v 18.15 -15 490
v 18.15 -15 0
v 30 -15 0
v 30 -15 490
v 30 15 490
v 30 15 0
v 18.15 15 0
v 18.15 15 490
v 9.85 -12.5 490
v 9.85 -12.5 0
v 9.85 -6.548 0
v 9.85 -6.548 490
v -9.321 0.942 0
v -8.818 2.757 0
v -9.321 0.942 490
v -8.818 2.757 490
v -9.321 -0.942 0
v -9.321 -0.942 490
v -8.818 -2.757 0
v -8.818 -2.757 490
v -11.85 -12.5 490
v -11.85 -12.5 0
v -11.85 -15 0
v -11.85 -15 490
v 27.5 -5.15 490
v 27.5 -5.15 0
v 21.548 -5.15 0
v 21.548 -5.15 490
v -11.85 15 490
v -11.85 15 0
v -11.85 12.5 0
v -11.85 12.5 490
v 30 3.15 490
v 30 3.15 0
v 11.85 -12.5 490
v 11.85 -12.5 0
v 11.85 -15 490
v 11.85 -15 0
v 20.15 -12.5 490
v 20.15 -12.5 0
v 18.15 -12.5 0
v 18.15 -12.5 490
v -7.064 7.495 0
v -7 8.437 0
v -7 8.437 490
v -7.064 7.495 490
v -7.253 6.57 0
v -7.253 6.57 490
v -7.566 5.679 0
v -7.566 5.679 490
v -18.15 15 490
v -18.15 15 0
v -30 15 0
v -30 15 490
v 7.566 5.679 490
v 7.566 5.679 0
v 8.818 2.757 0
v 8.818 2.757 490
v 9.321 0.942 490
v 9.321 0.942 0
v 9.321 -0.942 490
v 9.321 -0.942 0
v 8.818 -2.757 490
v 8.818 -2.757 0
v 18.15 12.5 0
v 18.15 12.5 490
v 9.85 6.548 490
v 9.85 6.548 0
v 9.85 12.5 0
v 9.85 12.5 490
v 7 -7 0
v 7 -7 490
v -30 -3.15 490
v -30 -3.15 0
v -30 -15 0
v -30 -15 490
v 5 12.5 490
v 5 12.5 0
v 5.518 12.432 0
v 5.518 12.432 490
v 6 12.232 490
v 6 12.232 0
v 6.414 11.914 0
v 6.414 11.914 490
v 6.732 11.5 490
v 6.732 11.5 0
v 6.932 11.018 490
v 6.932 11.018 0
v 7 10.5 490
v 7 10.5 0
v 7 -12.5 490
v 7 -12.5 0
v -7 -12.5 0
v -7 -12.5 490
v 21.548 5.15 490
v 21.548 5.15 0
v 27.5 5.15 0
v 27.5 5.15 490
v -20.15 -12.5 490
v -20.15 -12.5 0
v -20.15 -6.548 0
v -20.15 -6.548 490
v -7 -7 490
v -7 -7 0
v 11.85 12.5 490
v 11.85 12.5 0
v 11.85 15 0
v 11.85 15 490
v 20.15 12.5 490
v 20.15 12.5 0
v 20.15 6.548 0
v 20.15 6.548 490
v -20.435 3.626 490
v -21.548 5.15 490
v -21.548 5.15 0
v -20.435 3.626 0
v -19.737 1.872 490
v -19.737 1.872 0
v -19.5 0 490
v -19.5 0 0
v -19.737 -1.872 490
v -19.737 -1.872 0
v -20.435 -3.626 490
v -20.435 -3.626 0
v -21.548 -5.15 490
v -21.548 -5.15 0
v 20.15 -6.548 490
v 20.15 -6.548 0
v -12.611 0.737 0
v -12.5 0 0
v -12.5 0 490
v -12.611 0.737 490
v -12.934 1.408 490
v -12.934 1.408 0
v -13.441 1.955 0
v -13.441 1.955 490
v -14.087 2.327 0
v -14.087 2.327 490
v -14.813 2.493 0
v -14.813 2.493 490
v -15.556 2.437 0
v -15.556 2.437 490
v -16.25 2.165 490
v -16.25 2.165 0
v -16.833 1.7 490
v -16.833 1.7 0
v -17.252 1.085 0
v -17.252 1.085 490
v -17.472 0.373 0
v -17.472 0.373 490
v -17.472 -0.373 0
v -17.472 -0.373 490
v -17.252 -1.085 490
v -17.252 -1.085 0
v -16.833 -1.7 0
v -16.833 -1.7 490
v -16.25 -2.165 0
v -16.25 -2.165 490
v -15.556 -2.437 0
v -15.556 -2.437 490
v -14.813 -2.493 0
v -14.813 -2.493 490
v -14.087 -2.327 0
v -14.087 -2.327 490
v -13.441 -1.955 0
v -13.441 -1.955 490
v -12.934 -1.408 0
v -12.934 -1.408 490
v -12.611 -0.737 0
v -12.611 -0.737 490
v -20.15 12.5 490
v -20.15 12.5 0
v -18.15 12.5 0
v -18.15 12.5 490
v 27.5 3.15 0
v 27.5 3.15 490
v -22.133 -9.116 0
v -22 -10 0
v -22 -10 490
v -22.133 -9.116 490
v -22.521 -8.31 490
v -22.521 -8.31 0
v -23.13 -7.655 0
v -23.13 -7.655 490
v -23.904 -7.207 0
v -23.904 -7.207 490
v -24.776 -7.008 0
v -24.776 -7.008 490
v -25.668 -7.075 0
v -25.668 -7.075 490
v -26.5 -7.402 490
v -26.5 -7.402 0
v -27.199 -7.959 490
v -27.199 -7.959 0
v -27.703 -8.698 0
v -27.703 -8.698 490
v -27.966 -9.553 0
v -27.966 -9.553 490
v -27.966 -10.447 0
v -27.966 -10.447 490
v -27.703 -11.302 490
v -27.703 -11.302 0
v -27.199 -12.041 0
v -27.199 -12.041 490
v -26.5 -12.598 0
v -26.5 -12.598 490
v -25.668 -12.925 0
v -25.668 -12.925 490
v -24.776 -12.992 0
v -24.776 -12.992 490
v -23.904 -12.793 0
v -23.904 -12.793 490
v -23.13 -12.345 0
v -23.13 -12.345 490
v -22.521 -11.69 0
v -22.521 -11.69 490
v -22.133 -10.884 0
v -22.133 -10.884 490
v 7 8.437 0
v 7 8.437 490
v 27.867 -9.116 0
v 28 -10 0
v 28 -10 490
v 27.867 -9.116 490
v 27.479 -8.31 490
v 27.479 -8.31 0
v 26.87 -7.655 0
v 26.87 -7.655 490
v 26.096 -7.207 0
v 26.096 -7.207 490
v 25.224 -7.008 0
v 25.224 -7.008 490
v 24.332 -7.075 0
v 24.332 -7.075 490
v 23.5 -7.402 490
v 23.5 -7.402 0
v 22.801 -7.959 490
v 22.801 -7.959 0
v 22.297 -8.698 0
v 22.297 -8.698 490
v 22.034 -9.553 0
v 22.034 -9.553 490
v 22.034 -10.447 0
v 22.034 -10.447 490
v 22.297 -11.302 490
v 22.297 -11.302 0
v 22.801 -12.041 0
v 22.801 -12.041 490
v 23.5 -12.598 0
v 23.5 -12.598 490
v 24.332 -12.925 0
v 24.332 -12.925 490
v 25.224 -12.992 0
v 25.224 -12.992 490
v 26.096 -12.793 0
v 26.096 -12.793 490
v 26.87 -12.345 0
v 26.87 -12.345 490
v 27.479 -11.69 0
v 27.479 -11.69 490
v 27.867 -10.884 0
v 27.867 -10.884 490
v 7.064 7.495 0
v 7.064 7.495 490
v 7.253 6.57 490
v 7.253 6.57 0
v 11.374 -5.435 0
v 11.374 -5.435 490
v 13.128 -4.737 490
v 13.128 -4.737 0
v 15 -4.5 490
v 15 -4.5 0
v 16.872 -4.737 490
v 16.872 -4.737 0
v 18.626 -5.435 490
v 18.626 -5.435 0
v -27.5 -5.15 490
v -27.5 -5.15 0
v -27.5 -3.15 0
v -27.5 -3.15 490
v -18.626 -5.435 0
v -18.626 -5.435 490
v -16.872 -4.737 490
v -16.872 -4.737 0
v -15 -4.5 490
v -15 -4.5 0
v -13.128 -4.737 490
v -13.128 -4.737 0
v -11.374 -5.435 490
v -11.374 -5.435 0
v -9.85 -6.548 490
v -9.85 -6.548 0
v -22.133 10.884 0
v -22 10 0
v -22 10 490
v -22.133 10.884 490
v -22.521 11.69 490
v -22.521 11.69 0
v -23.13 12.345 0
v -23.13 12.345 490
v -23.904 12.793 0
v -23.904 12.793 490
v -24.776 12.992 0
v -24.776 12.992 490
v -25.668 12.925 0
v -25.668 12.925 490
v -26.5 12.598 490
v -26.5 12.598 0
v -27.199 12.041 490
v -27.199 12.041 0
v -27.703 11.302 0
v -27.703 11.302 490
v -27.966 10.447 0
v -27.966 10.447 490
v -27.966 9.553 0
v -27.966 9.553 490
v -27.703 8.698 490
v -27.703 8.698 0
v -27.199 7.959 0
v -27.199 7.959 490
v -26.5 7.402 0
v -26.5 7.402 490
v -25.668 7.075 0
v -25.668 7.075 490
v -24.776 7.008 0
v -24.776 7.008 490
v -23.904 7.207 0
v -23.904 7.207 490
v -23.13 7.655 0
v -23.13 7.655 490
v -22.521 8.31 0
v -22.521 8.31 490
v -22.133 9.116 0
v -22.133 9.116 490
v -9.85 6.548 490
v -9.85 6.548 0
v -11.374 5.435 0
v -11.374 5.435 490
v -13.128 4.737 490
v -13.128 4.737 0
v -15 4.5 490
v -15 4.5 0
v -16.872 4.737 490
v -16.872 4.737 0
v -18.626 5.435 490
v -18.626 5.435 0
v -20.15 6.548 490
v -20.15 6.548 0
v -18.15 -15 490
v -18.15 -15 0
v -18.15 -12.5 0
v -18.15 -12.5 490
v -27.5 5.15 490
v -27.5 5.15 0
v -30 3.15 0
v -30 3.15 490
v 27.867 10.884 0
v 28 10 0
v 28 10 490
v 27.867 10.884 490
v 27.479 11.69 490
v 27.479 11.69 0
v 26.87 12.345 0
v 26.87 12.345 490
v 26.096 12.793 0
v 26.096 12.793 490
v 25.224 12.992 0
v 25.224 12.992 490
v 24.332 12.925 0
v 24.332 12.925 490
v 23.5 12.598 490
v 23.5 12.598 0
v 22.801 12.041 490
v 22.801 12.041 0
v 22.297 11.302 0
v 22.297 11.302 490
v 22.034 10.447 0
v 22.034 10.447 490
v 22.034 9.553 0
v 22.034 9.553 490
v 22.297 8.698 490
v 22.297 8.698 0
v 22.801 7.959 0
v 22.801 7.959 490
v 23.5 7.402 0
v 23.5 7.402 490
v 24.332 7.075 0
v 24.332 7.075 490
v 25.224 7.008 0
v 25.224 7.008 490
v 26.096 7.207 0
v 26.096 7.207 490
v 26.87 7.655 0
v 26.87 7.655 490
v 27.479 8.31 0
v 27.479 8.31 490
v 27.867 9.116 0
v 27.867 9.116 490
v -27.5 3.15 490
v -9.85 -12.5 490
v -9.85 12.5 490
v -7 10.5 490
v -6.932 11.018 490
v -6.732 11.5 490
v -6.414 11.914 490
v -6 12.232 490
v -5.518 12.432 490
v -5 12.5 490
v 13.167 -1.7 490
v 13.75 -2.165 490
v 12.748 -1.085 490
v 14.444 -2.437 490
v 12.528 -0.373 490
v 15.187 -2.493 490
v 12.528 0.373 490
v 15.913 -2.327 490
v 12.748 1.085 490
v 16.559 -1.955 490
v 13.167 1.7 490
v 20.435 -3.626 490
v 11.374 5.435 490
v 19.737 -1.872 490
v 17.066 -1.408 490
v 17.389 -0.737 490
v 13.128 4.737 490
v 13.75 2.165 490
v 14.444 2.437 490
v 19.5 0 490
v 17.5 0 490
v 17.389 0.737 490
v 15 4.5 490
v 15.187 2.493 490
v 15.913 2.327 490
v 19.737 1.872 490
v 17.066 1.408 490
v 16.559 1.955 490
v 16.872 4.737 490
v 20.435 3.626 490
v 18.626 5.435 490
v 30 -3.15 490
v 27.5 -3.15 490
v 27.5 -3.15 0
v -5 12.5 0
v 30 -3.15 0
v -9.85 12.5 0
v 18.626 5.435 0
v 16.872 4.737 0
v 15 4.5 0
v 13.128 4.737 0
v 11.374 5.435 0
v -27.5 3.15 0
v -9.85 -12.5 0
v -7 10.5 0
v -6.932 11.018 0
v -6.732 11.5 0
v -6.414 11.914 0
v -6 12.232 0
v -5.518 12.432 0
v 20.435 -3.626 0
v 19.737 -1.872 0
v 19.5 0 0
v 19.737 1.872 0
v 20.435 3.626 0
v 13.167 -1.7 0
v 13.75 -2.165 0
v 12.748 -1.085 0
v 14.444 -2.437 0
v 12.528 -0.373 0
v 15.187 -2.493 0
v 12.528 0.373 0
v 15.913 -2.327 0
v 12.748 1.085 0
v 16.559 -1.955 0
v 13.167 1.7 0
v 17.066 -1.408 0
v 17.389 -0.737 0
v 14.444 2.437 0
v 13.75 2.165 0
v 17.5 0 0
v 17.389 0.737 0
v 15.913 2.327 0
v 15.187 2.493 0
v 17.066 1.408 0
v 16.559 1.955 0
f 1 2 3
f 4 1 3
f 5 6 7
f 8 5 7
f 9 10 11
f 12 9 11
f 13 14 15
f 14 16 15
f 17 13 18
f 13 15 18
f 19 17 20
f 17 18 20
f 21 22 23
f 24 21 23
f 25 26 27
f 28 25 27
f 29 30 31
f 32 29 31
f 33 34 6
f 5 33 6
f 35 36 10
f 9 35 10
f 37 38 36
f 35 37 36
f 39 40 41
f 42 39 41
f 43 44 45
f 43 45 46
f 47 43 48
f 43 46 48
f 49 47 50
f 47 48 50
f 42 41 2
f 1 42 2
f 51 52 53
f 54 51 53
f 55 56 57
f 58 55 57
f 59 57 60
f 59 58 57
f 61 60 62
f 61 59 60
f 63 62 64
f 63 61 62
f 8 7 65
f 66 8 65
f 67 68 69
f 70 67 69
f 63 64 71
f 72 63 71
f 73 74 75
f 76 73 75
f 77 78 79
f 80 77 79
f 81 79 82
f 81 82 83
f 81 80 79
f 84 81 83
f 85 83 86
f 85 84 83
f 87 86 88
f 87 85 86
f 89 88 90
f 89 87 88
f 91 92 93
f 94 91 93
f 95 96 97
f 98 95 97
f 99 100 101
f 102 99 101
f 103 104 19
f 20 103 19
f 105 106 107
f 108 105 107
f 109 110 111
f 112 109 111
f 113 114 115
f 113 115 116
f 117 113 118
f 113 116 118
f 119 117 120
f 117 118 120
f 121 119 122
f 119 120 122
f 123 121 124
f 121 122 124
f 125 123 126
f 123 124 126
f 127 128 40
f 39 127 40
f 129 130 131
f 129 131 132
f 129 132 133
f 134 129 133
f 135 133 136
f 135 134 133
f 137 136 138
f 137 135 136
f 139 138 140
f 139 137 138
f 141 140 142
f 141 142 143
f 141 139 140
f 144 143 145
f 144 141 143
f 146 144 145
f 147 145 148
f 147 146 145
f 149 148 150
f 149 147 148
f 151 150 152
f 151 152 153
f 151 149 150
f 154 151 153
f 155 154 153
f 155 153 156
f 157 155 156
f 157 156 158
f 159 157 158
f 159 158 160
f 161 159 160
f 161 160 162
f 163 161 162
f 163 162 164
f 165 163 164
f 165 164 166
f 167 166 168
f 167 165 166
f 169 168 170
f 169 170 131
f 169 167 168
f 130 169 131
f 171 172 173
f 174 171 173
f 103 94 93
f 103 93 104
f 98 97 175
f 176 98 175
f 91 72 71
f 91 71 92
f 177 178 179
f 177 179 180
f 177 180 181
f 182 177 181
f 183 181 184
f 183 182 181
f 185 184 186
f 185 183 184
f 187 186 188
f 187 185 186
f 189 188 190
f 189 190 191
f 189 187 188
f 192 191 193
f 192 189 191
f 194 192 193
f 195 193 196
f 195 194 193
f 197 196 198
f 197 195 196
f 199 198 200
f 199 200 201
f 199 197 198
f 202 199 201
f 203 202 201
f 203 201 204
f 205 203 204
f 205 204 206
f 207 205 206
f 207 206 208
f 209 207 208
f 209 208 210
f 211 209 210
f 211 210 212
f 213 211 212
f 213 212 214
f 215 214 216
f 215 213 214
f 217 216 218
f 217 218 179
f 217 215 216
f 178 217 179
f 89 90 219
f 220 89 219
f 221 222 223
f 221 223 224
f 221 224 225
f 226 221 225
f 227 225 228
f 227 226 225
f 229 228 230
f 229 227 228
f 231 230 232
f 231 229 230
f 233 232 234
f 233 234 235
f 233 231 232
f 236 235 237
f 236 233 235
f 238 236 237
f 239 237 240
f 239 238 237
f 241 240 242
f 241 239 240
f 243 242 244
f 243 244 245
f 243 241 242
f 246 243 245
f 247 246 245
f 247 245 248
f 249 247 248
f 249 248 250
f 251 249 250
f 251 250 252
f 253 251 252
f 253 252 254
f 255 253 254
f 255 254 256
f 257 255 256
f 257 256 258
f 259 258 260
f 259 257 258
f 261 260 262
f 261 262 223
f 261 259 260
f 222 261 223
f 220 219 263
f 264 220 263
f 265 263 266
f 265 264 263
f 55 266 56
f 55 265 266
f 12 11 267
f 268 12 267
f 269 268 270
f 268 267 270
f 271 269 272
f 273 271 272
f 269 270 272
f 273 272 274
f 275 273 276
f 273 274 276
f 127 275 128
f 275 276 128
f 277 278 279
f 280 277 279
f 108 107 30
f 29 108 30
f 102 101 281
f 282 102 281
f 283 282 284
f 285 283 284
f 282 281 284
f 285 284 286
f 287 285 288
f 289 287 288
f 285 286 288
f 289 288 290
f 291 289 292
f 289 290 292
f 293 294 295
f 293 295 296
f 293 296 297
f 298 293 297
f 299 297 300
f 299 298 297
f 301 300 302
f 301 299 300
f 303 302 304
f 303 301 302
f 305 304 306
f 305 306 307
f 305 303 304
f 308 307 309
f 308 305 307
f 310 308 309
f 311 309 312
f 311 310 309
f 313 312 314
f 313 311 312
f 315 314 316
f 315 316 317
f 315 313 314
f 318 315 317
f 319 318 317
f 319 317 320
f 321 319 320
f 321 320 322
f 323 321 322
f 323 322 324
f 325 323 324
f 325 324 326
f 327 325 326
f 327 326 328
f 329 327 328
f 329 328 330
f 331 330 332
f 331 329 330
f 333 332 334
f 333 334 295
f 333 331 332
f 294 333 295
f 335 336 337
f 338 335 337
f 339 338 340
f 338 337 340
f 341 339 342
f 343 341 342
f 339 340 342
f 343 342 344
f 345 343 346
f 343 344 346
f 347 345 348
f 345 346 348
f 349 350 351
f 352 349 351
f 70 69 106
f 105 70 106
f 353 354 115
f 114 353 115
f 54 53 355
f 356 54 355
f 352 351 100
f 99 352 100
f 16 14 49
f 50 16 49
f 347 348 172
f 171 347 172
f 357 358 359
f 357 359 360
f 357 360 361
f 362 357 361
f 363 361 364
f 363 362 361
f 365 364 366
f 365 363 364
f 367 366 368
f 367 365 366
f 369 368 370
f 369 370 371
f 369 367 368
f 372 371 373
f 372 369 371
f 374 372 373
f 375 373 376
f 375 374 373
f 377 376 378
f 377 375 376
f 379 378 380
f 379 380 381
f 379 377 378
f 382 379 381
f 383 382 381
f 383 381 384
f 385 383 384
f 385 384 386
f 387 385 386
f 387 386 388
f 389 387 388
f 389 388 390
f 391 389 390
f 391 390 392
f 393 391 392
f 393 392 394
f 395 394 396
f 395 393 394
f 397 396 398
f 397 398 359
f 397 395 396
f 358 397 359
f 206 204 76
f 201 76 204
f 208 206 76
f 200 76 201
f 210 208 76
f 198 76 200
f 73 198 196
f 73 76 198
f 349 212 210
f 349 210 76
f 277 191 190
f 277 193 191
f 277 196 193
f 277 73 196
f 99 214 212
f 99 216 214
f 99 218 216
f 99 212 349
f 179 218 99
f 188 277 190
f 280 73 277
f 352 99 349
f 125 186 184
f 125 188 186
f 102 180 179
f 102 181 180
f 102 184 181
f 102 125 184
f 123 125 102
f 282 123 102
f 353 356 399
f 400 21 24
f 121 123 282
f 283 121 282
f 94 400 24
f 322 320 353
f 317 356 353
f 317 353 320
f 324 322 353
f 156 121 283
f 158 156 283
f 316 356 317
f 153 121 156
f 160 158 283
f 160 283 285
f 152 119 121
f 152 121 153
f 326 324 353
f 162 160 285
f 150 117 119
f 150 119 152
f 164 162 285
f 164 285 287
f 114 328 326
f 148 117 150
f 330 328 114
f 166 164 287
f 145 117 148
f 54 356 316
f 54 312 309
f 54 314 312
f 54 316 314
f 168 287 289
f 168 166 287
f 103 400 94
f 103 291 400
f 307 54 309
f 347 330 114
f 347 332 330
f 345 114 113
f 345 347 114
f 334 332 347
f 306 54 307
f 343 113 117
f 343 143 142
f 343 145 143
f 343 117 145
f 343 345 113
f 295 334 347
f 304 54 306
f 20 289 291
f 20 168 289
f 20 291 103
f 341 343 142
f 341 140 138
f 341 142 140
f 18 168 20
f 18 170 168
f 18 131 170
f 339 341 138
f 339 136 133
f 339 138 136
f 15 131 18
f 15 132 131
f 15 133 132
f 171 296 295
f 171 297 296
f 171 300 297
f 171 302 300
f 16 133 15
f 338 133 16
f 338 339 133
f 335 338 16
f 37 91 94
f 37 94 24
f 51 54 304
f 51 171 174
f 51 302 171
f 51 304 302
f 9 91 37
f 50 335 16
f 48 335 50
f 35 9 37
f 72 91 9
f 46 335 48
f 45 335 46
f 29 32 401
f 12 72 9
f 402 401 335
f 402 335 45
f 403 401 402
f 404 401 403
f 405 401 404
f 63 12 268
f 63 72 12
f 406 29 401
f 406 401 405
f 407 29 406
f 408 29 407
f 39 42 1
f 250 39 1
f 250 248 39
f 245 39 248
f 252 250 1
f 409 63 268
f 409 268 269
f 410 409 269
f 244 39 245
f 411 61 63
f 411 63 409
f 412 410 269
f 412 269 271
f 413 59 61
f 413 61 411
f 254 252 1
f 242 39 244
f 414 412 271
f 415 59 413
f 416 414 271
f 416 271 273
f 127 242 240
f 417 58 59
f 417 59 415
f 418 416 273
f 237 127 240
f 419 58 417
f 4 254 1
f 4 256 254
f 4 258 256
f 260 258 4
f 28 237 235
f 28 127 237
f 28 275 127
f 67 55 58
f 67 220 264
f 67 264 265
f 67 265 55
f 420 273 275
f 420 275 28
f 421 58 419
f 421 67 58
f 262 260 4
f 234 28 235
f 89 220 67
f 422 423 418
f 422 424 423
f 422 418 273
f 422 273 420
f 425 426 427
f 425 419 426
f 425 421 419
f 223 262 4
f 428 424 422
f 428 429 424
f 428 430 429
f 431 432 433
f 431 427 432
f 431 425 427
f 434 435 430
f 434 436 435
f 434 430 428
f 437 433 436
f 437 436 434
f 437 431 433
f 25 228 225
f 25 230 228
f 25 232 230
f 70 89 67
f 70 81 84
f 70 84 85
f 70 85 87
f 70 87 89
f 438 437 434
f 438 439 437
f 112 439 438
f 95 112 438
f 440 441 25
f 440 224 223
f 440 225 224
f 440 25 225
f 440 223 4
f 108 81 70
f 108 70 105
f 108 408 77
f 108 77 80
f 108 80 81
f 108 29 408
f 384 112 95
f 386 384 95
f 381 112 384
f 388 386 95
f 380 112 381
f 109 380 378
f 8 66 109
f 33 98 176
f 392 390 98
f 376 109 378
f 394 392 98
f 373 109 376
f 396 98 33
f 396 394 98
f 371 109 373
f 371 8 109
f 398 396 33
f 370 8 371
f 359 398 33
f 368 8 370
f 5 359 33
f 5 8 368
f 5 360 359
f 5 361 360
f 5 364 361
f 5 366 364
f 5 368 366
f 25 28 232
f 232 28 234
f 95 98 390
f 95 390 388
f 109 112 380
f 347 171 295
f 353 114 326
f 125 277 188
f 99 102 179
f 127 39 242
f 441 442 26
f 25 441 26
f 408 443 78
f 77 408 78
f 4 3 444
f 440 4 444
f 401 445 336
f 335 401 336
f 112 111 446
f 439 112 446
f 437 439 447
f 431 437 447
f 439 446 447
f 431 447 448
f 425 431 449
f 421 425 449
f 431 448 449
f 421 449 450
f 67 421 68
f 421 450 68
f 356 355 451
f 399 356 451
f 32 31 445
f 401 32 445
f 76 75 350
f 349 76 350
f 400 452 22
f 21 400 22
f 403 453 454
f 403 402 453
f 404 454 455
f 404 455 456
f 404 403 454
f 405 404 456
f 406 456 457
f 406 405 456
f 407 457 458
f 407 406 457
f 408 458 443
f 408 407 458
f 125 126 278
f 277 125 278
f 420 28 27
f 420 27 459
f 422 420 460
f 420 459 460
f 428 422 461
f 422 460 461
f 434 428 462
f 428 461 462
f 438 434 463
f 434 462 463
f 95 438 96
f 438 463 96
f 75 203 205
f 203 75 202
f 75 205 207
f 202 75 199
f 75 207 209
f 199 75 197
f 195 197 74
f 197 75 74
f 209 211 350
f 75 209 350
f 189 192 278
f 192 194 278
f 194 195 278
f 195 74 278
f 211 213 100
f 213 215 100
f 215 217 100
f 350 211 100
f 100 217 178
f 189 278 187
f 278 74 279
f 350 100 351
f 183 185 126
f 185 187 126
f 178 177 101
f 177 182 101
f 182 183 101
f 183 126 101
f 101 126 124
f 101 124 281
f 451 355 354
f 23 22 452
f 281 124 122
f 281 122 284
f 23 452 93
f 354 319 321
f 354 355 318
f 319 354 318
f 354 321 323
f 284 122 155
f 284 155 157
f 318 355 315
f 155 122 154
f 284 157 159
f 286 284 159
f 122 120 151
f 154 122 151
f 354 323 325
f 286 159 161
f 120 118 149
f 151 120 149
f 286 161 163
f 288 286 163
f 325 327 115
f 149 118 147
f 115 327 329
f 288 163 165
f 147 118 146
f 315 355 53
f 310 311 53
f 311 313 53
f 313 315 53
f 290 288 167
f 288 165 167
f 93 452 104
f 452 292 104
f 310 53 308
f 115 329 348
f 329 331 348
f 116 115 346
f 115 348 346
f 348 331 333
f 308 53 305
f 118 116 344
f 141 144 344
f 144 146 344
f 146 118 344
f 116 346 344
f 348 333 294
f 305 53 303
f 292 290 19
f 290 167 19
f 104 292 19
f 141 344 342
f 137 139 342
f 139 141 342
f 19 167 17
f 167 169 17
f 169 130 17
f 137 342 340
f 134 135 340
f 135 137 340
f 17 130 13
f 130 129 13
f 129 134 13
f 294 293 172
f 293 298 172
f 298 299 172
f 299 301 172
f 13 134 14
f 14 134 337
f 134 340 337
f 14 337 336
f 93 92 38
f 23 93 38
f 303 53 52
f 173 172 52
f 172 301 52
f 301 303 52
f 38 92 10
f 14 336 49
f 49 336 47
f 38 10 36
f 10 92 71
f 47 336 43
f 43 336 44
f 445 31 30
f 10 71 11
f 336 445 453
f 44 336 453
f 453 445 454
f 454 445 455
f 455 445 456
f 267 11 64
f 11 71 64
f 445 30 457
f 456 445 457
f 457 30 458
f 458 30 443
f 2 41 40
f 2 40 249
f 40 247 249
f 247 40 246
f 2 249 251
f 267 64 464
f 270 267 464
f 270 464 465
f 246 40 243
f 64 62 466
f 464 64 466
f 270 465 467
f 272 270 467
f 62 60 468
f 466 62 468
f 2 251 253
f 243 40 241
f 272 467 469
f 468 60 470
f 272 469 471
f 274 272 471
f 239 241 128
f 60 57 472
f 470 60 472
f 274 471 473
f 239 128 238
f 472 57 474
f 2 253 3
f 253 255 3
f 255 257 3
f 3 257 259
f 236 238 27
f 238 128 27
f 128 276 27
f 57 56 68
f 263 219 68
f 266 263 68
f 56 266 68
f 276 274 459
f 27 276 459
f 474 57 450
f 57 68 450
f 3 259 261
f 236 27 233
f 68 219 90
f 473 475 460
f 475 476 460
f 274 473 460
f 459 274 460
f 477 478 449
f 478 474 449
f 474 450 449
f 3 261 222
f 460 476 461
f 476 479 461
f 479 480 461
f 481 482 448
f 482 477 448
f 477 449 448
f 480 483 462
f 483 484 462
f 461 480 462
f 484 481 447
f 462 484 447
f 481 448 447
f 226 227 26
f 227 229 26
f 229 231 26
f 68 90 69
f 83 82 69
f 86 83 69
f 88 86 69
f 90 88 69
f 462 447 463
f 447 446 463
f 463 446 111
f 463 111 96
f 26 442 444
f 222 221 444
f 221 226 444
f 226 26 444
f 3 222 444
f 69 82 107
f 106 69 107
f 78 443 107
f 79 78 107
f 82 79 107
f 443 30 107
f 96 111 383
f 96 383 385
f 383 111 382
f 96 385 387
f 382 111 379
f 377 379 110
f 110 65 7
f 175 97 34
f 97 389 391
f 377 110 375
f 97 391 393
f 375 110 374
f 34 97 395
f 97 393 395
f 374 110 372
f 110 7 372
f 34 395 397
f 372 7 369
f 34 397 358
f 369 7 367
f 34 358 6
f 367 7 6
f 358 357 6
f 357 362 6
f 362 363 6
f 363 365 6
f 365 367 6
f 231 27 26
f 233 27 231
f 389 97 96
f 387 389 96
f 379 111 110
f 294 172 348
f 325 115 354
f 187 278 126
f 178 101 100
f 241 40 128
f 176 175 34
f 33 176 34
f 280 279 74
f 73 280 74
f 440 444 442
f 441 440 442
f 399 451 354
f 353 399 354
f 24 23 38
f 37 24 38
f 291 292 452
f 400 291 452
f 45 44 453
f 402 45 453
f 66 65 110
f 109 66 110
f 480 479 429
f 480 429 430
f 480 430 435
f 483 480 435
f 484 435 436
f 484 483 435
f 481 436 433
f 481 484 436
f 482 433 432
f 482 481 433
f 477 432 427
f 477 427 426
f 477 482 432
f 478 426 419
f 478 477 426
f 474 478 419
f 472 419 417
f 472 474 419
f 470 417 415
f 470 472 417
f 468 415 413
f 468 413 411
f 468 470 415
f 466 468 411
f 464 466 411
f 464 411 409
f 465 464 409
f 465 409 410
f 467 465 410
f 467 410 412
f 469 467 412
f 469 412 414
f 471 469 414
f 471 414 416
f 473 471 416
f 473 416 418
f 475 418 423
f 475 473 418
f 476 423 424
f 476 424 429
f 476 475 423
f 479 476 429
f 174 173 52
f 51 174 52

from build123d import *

# Parameters (mm, degrees)
F0_R     = 3
F0_R_2   = 2.5
F1_DEPTH = 490
F2_R     = 2
F3_R     = 7


# Not quite as in the source:
# - a feature names something its author has since deleted; it is built from what else it names


with BuildPart() as f1:
    # F0 (on Top) → F1 (new body)
    with BuildSketch(Plane.XY):
        with BuildLine():
            Line((18.15, -15), (30, -15))
            Line((30, -15), (30, -3.15))
            Line((30, -3.15), (27.5, -3.15))
            Line((27.5, -3.15), (27.5, -5.15))
            Line((27.5, -5.15), (21.5477069044, -5.15))
            ThreePointArc((21.5477069044, -5.15), (19.5, 0), (21.5477069044, 5.15))
            Line((21.5477069044, 5.15), (27.5, 5.15))
            Line((27.5, 5.15), (27.5, 3.15))
            Line((27.5, 3.15), (30, 3.15))
            Line((30, 3.15), (30, 15))
            Line((30, 15), (18.15, 15))
            Line((18.15, 15), (18.15, 12.5))
            Line((18.15, 12.5), (20.15, 12.5))
            Line((20.15, 12.5), (20.15, 6.5477069044))
            ThreePointArc((20.15, 6.5477069044), (15, 4.5), (9.85, 6.5477069044))
            Line((9.85, 6.5477069044), (9.85, 12.5))
            Line((9.85, 12.5), (11.85, 12.5))
            Line((11.85, 12.5), (11.85, 15))
            Line((11.85, 15), (-11.85, 15))
            Line((-11.85, 15), (-11.85, 12.5))
            Line((-11.85, 12.5), (-9.85, 12.5))
            Line((-9.85, 12.5), (-9.85, 6.5477069044))
            ThreePointArc((-9.85, 6.5477069044), (-15, 4.5), (-20.15, 6.5477069044))
            Line((-20.15, 6.5477069044), (-20.15, 12.5))
            Line((-20.15, 12.5), (-18.15, 12.5))
            Line((-18.15, 12.5), (-18.15, 15))
            Line((-18.15, 15), (-30, 15))
            Line((-30, 15), (-30, 3.15))
            Line((-30, 3.15), (-27.5, 3.15))
            Line((-27.5, 3.15), (-27.5, 5.15))
            Line((-27.5, 5.15), (-21.5477069044, 5.15))
            ThreePointArc((-21.5477069044, 5.15), (-19.5, 0), (-21.5477069044, -5.15))
            Line((-21.5477069044, -5.15), (-27.5, -5.15))
            Line((-27.5, -5.15), (-27.5, -3.15))
            Line((-27.5, -3.15), (-30, -3.15))
            Line((-30, -3.15), (-30, -15))
            Line((-30, -15), (-18.15, -15))
            Line((-18.15, -15), (-18.15, -12.5))
            Line((-18.15, -12.5), (-20.15, -12.5))
            Line((-20.15, -12.5), (-20.15, -6.5477069044))
            ThreePointArc((-20.15, -6.5477069044), (-15, -4.5), (-9.85, -6.5477069044))
            Line((-9.85, -6.5477069044), (-9.85, -12.5))
            Line((-9.85, -12.5), (-11.85, -12.5))
            Line((-11.85, -12.5), (-11.85, -15))
            Line((-11.85, -15), (11.85, -15))
            Line((11.85, -15), (11.85, -12.5))
            Line((11.85, -12.5), (9.85, -12.5))
            Line((9.85, -12.5), (9.85, -6.5477069044))
            ThreePointArc((9.85, -6.5477069044), (15, -4.5), (20.15, -6.5477069044))
            Line((20.15, -6.5477069044), (20.15, -12.5))
            Line((20.15, -12.5), (18.15, -12.5))
            Line((18.15, -12.5), (18.15, -15))
        make_face()
        with Locations((-25, -10)):
            Circle(F0_R, mode=Mode.SUBTRACT)
        with Locations((25, -10)):
            Circle(F0_R, mode=Mode.SUBTRACT)
        with Locations((-15, 0)):
            Circle(F0_R_2, mode=Mode.SUBTRACT)
        with Locations((-25, 10)):
            Circle(F0_R, mode=Mode.SUBTRACT)
        Polygon((-7, 7), (-7, 12.5), (0, 12.5), (7, 12.5), (7, 7), (10, 0), (7, -7), (7, -12.5), (0, -12.5), (-7, -12.5), (-7, -7), (-10, 0), align=None, mode=Mode.SUBTRACT)
        with Locations((15, 0)):
            Circle(F0_R_2, mode=Mode.SUBTRACT)
        with Locations((25, 10)):
            Circle(F0_R, mode=Mode.SUBTRACT)
    extrude(amount=F1_DEPTH)

    # F2
    f2_edges = [f1.edges().sort_by_distance(p)[0] for p in [
        (-7, 12.5, 245),
        (7, 12.5, 245),
    ]]
    fillet(f2_edges, radius=F2_R)

    # F3
    f3_edges = [f1.edges().sort_by_distance(p)[0] for p in [
        (-7, 7, 245),
        (-10, 0, 245),
        (7, 7, 245),
        (10, 0, 245),
    ]]
    fillet(f3_edges, radius=F3_R)


solid = f1.part
